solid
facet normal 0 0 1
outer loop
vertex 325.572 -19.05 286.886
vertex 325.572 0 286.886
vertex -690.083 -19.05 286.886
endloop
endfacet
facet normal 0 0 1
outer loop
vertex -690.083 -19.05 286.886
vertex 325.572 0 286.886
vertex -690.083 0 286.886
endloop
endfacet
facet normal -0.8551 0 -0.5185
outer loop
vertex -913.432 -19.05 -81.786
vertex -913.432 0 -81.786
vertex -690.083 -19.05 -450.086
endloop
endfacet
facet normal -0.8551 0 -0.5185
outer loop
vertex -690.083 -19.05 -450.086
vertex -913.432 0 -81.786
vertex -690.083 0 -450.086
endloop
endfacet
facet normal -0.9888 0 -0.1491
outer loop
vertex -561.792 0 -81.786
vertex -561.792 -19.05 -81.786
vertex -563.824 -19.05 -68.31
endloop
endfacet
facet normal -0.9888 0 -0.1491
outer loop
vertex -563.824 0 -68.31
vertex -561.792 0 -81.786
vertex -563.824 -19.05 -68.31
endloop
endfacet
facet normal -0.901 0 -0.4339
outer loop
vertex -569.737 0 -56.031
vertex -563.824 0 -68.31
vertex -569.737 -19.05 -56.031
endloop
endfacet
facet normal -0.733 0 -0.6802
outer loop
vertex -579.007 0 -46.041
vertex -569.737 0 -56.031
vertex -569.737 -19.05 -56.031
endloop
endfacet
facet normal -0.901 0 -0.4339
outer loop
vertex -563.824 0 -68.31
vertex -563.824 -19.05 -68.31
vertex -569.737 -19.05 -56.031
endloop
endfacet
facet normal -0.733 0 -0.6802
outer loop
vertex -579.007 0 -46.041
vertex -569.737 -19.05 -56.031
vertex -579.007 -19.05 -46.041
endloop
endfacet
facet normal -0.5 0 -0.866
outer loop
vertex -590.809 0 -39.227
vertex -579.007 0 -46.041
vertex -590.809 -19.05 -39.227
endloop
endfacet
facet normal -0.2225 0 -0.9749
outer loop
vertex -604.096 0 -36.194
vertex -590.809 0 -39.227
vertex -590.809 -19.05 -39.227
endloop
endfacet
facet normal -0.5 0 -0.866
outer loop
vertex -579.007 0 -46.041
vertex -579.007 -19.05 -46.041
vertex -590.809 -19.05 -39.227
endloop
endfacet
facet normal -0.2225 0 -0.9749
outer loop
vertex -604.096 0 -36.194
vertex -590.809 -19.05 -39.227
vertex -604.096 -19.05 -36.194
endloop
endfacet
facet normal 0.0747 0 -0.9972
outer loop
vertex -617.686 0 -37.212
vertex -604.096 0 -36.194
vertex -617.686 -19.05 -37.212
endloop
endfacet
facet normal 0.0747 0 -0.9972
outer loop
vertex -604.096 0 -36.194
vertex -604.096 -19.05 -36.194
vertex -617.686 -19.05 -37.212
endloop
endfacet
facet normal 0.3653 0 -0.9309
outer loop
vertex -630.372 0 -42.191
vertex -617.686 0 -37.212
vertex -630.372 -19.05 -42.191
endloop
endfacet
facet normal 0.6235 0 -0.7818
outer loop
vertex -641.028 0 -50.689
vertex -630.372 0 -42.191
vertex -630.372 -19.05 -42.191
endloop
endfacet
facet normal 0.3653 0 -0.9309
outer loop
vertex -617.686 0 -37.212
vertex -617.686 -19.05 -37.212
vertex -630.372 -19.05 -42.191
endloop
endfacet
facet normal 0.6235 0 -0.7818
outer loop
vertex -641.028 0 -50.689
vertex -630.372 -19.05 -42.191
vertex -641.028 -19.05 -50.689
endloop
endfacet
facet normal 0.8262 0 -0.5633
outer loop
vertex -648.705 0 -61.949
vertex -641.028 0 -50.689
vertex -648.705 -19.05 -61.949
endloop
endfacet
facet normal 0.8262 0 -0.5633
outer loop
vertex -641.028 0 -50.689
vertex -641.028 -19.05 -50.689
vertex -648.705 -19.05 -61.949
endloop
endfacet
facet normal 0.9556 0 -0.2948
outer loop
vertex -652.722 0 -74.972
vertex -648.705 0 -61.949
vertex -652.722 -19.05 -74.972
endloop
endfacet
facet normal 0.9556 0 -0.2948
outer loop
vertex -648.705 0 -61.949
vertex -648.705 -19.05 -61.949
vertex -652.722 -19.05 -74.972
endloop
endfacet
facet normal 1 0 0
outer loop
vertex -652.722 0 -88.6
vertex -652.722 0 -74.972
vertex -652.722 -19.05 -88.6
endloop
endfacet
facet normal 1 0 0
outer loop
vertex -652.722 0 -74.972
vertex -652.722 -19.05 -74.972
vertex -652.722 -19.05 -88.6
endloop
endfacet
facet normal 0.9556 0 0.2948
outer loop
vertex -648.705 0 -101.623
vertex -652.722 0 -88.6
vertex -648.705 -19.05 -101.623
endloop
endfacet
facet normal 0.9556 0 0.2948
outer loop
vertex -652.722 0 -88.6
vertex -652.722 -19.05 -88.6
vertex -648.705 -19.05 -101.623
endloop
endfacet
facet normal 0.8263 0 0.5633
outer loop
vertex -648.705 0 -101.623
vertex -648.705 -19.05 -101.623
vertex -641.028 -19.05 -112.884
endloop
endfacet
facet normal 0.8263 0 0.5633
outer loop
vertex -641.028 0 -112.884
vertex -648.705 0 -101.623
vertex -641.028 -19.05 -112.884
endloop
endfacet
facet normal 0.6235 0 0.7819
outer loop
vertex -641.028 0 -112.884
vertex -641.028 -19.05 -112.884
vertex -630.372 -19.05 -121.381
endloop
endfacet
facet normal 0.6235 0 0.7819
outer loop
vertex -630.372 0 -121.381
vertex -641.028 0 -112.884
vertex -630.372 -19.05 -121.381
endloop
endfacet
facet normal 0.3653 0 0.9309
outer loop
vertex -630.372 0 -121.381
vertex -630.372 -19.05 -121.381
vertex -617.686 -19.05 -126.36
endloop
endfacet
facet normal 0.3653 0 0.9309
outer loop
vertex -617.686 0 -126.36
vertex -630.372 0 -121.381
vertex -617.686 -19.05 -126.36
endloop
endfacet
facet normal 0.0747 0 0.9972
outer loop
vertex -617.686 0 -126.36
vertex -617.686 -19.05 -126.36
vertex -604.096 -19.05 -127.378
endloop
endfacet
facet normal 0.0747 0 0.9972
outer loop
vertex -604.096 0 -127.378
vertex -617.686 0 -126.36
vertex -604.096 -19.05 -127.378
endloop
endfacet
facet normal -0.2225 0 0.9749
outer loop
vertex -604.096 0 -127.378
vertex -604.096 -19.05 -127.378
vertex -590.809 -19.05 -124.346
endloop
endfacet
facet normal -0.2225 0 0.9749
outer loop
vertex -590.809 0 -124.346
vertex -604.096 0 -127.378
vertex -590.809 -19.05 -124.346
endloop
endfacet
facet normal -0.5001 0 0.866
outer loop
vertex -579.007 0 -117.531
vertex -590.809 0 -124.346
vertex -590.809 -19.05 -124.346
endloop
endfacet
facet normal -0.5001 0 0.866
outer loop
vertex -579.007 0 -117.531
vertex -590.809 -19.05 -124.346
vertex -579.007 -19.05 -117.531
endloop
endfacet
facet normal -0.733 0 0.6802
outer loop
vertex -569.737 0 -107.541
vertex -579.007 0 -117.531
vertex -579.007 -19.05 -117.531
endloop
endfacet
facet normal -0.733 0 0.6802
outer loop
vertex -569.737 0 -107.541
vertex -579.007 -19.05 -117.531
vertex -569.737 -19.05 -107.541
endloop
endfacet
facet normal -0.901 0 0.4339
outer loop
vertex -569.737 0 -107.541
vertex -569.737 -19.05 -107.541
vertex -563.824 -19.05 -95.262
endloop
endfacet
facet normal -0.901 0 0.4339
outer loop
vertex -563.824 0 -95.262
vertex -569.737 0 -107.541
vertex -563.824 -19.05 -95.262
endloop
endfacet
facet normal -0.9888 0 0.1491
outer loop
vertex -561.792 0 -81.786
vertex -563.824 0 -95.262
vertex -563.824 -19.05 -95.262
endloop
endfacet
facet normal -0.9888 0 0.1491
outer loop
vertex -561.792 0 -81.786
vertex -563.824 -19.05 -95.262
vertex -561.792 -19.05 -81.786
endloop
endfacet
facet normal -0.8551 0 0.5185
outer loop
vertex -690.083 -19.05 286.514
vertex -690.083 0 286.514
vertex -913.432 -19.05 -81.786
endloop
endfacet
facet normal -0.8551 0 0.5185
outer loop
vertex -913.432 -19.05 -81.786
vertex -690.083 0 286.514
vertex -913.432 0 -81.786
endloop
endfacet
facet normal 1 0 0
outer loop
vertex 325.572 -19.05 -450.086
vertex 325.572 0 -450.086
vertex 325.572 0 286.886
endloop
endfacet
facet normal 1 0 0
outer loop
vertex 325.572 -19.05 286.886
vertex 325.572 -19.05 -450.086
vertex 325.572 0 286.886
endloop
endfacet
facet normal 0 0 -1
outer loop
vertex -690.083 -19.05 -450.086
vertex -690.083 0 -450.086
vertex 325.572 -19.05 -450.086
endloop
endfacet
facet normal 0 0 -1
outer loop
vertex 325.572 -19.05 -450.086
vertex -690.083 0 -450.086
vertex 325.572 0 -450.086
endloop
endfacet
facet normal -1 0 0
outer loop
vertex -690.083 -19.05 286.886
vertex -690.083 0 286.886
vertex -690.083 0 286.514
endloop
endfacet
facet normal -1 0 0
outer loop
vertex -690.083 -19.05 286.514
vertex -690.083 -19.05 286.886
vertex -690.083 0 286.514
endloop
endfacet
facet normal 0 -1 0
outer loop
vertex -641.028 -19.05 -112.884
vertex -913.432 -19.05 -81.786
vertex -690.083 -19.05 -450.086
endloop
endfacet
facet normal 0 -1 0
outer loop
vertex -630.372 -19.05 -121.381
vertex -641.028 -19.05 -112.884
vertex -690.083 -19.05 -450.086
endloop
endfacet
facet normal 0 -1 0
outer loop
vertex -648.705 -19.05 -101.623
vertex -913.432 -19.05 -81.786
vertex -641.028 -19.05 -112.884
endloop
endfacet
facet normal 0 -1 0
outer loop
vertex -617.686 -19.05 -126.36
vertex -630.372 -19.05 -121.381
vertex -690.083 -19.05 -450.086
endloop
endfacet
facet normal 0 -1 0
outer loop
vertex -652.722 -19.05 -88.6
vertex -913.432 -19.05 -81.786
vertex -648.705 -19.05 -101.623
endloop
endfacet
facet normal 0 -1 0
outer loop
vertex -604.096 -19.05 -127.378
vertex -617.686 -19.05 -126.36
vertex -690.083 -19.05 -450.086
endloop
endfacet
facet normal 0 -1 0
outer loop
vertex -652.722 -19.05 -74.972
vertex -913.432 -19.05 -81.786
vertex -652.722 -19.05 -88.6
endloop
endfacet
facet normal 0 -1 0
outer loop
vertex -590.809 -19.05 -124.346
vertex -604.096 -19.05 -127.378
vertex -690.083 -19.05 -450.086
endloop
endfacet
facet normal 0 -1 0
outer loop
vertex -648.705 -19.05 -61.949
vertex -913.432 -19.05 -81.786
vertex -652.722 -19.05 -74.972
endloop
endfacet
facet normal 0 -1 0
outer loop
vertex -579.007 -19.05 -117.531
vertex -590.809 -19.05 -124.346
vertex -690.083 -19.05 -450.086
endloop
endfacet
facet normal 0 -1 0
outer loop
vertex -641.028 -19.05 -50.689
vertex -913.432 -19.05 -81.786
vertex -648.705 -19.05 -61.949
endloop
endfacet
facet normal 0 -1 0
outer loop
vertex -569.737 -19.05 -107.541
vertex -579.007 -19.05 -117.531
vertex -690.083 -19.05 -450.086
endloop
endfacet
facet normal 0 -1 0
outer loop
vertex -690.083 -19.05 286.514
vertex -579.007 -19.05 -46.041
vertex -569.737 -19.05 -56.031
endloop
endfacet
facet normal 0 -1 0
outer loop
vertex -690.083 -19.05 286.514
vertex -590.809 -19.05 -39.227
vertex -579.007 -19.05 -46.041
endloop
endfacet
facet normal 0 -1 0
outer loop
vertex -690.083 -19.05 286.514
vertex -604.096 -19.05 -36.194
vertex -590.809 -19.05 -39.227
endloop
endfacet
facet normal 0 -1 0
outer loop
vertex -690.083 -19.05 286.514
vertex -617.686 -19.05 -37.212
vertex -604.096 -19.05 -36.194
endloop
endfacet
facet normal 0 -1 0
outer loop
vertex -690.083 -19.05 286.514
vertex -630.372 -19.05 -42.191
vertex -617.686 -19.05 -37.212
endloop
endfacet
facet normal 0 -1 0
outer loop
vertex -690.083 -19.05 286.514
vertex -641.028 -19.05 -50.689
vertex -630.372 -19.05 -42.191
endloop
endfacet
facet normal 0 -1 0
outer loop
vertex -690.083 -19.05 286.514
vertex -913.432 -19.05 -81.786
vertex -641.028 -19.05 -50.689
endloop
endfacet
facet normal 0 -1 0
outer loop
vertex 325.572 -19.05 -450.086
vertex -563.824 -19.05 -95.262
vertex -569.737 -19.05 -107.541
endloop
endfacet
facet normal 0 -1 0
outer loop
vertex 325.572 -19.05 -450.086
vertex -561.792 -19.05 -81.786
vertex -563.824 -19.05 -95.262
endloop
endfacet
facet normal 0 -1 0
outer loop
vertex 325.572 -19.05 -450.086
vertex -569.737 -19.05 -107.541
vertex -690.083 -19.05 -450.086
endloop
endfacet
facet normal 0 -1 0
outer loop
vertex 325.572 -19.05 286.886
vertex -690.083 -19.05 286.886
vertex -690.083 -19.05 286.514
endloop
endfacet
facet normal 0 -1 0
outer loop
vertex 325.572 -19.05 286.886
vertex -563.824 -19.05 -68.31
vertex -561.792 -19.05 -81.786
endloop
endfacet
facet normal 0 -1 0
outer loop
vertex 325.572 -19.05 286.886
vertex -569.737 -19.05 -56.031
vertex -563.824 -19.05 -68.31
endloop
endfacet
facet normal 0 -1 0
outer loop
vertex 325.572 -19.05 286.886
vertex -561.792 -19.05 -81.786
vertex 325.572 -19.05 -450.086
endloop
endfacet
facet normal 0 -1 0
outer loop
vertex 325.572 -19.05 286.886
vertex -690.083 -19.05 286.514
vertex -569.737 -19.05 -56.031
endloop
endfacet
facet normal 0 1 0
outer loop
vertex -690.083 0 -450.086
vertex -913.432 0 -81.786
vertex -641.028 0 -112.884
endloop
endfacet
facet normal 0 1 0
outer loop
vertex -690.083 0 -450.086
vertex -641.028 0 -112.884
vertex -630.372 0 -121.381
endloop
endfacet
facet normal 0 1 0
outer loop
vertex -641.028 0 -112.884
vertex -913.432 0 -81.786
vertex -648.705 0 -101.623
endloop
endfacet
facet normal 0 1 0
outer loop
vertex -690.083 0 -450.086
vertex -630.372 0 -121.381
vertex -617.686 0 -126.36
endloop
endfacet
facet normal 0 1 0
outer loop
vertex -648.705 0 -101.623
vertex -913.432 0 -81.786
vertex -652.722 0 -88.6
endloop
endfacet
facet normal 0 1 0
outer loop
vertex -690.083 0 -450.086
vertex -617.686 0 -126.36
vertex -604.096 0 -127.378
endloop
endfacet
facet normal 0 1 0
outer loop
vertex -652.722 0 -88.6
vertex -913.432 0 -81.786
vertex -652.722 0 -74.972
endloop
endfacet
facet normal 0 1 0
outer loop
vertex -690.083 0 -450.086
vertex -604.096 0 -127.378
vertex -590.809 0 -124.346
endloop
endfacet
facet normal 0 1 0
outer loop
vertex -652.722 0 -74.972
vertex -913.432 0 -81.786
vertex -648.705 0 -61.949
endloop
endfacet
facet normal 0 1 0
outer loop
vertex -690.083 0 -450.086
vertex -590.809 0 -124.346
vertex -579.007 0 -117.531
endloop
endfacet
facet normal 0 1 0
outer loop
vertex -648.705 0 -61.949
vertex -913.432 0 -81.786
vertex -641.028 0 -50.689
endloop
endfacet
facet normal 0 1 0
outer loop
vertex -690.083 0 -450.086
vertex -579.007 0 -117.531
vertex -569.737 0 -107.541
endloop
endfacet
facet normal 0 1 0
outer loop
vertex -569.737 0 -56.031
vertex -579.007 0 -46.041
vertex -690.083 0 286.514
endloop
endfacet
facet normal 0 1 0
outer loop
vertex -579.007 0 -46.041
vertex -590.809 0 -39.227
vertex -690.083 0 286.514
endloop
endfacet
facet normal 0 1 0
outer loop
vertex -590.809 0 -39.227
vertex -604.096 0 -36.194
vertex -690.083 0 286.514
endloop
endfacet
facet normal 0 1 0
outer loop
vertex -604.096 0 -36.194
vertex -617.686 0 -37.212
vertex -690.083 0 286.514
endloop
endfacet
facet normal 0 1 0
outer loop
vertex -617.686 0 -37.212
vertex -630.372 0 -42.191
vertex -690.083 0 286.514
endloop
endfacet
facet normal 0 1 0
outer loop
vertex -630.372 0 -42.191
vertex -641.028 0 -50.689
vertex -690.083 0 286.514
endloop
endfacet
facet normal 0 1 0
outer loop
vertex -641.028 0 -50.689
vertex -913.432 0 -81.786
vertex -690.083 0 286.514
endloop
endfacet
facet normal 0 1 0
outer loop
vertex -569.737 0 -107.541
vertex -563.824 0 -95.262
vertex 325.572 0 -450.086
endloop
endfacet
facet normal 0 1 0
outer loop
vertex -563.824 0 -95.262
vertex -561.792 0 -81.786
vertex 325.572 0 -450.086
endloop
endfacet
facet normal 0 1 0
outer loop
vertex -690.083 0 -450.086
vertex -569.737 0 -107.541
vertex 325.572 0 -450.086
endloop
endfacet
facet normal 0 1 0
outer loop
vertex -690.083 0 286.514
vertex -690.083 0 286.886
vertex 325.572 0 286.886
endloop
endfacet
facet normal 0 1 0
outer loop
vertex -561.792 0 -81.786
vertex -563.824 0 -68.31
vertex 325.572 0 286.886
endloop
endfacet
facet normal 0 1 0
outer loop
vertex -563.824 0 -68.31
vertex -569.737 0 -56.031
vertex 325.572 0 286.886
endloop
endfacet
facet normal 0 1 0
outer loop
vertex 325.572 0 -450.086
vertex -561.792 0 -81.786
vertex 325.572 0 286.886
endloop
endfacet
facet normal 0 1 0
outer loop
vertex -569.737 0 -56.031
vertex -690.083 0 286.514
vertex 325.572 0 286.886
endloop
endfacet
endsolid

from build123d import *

# Parameters (mm, degrees)
F1_DEPTH = 19.05
F2_R     = 45.72
F3_DEPTH = 25.4


with BuildPart() as f1:
    # F0 (on Front) → F1 (new body)
    with BuildSketch(Plane.XZ):
        Polygon((-690.083177, 286.513845), (-913.432107, -81.786155), (-690.083177, -450.086155), (-563.697045, -449.713886), (198.302955, -449.713886), (325.572278, -449.713886), (325.572278, 286.886114), (198.572278, 286.886114), (198.302955, 286.886114), (-563.697045, 286.886114), align=None)
        Polygon((-563.697045, -449.713886), (-690.083177, -450.086155), (325.572278, -450.086155), (325.572278, -449.713886), (198.302955, -449.713886), align=None)
        Polygon((-690.083177, 286.886114), (-690.083177, 286.513845), (-563.697045, 286.886114), align=None)
    extrude(amount=F1_DEPTH)

    # F2 (on face) → F3 (cut)
    with BuildSketch(Plane.XZ.offset(19.05)):
        with Locations((-607.512472, -81.786155)):
            Circle(F2_R)
    extrude(amount=-F3_DEPTH, mode=Mode.SUBTRACT)


solid = f1.part
